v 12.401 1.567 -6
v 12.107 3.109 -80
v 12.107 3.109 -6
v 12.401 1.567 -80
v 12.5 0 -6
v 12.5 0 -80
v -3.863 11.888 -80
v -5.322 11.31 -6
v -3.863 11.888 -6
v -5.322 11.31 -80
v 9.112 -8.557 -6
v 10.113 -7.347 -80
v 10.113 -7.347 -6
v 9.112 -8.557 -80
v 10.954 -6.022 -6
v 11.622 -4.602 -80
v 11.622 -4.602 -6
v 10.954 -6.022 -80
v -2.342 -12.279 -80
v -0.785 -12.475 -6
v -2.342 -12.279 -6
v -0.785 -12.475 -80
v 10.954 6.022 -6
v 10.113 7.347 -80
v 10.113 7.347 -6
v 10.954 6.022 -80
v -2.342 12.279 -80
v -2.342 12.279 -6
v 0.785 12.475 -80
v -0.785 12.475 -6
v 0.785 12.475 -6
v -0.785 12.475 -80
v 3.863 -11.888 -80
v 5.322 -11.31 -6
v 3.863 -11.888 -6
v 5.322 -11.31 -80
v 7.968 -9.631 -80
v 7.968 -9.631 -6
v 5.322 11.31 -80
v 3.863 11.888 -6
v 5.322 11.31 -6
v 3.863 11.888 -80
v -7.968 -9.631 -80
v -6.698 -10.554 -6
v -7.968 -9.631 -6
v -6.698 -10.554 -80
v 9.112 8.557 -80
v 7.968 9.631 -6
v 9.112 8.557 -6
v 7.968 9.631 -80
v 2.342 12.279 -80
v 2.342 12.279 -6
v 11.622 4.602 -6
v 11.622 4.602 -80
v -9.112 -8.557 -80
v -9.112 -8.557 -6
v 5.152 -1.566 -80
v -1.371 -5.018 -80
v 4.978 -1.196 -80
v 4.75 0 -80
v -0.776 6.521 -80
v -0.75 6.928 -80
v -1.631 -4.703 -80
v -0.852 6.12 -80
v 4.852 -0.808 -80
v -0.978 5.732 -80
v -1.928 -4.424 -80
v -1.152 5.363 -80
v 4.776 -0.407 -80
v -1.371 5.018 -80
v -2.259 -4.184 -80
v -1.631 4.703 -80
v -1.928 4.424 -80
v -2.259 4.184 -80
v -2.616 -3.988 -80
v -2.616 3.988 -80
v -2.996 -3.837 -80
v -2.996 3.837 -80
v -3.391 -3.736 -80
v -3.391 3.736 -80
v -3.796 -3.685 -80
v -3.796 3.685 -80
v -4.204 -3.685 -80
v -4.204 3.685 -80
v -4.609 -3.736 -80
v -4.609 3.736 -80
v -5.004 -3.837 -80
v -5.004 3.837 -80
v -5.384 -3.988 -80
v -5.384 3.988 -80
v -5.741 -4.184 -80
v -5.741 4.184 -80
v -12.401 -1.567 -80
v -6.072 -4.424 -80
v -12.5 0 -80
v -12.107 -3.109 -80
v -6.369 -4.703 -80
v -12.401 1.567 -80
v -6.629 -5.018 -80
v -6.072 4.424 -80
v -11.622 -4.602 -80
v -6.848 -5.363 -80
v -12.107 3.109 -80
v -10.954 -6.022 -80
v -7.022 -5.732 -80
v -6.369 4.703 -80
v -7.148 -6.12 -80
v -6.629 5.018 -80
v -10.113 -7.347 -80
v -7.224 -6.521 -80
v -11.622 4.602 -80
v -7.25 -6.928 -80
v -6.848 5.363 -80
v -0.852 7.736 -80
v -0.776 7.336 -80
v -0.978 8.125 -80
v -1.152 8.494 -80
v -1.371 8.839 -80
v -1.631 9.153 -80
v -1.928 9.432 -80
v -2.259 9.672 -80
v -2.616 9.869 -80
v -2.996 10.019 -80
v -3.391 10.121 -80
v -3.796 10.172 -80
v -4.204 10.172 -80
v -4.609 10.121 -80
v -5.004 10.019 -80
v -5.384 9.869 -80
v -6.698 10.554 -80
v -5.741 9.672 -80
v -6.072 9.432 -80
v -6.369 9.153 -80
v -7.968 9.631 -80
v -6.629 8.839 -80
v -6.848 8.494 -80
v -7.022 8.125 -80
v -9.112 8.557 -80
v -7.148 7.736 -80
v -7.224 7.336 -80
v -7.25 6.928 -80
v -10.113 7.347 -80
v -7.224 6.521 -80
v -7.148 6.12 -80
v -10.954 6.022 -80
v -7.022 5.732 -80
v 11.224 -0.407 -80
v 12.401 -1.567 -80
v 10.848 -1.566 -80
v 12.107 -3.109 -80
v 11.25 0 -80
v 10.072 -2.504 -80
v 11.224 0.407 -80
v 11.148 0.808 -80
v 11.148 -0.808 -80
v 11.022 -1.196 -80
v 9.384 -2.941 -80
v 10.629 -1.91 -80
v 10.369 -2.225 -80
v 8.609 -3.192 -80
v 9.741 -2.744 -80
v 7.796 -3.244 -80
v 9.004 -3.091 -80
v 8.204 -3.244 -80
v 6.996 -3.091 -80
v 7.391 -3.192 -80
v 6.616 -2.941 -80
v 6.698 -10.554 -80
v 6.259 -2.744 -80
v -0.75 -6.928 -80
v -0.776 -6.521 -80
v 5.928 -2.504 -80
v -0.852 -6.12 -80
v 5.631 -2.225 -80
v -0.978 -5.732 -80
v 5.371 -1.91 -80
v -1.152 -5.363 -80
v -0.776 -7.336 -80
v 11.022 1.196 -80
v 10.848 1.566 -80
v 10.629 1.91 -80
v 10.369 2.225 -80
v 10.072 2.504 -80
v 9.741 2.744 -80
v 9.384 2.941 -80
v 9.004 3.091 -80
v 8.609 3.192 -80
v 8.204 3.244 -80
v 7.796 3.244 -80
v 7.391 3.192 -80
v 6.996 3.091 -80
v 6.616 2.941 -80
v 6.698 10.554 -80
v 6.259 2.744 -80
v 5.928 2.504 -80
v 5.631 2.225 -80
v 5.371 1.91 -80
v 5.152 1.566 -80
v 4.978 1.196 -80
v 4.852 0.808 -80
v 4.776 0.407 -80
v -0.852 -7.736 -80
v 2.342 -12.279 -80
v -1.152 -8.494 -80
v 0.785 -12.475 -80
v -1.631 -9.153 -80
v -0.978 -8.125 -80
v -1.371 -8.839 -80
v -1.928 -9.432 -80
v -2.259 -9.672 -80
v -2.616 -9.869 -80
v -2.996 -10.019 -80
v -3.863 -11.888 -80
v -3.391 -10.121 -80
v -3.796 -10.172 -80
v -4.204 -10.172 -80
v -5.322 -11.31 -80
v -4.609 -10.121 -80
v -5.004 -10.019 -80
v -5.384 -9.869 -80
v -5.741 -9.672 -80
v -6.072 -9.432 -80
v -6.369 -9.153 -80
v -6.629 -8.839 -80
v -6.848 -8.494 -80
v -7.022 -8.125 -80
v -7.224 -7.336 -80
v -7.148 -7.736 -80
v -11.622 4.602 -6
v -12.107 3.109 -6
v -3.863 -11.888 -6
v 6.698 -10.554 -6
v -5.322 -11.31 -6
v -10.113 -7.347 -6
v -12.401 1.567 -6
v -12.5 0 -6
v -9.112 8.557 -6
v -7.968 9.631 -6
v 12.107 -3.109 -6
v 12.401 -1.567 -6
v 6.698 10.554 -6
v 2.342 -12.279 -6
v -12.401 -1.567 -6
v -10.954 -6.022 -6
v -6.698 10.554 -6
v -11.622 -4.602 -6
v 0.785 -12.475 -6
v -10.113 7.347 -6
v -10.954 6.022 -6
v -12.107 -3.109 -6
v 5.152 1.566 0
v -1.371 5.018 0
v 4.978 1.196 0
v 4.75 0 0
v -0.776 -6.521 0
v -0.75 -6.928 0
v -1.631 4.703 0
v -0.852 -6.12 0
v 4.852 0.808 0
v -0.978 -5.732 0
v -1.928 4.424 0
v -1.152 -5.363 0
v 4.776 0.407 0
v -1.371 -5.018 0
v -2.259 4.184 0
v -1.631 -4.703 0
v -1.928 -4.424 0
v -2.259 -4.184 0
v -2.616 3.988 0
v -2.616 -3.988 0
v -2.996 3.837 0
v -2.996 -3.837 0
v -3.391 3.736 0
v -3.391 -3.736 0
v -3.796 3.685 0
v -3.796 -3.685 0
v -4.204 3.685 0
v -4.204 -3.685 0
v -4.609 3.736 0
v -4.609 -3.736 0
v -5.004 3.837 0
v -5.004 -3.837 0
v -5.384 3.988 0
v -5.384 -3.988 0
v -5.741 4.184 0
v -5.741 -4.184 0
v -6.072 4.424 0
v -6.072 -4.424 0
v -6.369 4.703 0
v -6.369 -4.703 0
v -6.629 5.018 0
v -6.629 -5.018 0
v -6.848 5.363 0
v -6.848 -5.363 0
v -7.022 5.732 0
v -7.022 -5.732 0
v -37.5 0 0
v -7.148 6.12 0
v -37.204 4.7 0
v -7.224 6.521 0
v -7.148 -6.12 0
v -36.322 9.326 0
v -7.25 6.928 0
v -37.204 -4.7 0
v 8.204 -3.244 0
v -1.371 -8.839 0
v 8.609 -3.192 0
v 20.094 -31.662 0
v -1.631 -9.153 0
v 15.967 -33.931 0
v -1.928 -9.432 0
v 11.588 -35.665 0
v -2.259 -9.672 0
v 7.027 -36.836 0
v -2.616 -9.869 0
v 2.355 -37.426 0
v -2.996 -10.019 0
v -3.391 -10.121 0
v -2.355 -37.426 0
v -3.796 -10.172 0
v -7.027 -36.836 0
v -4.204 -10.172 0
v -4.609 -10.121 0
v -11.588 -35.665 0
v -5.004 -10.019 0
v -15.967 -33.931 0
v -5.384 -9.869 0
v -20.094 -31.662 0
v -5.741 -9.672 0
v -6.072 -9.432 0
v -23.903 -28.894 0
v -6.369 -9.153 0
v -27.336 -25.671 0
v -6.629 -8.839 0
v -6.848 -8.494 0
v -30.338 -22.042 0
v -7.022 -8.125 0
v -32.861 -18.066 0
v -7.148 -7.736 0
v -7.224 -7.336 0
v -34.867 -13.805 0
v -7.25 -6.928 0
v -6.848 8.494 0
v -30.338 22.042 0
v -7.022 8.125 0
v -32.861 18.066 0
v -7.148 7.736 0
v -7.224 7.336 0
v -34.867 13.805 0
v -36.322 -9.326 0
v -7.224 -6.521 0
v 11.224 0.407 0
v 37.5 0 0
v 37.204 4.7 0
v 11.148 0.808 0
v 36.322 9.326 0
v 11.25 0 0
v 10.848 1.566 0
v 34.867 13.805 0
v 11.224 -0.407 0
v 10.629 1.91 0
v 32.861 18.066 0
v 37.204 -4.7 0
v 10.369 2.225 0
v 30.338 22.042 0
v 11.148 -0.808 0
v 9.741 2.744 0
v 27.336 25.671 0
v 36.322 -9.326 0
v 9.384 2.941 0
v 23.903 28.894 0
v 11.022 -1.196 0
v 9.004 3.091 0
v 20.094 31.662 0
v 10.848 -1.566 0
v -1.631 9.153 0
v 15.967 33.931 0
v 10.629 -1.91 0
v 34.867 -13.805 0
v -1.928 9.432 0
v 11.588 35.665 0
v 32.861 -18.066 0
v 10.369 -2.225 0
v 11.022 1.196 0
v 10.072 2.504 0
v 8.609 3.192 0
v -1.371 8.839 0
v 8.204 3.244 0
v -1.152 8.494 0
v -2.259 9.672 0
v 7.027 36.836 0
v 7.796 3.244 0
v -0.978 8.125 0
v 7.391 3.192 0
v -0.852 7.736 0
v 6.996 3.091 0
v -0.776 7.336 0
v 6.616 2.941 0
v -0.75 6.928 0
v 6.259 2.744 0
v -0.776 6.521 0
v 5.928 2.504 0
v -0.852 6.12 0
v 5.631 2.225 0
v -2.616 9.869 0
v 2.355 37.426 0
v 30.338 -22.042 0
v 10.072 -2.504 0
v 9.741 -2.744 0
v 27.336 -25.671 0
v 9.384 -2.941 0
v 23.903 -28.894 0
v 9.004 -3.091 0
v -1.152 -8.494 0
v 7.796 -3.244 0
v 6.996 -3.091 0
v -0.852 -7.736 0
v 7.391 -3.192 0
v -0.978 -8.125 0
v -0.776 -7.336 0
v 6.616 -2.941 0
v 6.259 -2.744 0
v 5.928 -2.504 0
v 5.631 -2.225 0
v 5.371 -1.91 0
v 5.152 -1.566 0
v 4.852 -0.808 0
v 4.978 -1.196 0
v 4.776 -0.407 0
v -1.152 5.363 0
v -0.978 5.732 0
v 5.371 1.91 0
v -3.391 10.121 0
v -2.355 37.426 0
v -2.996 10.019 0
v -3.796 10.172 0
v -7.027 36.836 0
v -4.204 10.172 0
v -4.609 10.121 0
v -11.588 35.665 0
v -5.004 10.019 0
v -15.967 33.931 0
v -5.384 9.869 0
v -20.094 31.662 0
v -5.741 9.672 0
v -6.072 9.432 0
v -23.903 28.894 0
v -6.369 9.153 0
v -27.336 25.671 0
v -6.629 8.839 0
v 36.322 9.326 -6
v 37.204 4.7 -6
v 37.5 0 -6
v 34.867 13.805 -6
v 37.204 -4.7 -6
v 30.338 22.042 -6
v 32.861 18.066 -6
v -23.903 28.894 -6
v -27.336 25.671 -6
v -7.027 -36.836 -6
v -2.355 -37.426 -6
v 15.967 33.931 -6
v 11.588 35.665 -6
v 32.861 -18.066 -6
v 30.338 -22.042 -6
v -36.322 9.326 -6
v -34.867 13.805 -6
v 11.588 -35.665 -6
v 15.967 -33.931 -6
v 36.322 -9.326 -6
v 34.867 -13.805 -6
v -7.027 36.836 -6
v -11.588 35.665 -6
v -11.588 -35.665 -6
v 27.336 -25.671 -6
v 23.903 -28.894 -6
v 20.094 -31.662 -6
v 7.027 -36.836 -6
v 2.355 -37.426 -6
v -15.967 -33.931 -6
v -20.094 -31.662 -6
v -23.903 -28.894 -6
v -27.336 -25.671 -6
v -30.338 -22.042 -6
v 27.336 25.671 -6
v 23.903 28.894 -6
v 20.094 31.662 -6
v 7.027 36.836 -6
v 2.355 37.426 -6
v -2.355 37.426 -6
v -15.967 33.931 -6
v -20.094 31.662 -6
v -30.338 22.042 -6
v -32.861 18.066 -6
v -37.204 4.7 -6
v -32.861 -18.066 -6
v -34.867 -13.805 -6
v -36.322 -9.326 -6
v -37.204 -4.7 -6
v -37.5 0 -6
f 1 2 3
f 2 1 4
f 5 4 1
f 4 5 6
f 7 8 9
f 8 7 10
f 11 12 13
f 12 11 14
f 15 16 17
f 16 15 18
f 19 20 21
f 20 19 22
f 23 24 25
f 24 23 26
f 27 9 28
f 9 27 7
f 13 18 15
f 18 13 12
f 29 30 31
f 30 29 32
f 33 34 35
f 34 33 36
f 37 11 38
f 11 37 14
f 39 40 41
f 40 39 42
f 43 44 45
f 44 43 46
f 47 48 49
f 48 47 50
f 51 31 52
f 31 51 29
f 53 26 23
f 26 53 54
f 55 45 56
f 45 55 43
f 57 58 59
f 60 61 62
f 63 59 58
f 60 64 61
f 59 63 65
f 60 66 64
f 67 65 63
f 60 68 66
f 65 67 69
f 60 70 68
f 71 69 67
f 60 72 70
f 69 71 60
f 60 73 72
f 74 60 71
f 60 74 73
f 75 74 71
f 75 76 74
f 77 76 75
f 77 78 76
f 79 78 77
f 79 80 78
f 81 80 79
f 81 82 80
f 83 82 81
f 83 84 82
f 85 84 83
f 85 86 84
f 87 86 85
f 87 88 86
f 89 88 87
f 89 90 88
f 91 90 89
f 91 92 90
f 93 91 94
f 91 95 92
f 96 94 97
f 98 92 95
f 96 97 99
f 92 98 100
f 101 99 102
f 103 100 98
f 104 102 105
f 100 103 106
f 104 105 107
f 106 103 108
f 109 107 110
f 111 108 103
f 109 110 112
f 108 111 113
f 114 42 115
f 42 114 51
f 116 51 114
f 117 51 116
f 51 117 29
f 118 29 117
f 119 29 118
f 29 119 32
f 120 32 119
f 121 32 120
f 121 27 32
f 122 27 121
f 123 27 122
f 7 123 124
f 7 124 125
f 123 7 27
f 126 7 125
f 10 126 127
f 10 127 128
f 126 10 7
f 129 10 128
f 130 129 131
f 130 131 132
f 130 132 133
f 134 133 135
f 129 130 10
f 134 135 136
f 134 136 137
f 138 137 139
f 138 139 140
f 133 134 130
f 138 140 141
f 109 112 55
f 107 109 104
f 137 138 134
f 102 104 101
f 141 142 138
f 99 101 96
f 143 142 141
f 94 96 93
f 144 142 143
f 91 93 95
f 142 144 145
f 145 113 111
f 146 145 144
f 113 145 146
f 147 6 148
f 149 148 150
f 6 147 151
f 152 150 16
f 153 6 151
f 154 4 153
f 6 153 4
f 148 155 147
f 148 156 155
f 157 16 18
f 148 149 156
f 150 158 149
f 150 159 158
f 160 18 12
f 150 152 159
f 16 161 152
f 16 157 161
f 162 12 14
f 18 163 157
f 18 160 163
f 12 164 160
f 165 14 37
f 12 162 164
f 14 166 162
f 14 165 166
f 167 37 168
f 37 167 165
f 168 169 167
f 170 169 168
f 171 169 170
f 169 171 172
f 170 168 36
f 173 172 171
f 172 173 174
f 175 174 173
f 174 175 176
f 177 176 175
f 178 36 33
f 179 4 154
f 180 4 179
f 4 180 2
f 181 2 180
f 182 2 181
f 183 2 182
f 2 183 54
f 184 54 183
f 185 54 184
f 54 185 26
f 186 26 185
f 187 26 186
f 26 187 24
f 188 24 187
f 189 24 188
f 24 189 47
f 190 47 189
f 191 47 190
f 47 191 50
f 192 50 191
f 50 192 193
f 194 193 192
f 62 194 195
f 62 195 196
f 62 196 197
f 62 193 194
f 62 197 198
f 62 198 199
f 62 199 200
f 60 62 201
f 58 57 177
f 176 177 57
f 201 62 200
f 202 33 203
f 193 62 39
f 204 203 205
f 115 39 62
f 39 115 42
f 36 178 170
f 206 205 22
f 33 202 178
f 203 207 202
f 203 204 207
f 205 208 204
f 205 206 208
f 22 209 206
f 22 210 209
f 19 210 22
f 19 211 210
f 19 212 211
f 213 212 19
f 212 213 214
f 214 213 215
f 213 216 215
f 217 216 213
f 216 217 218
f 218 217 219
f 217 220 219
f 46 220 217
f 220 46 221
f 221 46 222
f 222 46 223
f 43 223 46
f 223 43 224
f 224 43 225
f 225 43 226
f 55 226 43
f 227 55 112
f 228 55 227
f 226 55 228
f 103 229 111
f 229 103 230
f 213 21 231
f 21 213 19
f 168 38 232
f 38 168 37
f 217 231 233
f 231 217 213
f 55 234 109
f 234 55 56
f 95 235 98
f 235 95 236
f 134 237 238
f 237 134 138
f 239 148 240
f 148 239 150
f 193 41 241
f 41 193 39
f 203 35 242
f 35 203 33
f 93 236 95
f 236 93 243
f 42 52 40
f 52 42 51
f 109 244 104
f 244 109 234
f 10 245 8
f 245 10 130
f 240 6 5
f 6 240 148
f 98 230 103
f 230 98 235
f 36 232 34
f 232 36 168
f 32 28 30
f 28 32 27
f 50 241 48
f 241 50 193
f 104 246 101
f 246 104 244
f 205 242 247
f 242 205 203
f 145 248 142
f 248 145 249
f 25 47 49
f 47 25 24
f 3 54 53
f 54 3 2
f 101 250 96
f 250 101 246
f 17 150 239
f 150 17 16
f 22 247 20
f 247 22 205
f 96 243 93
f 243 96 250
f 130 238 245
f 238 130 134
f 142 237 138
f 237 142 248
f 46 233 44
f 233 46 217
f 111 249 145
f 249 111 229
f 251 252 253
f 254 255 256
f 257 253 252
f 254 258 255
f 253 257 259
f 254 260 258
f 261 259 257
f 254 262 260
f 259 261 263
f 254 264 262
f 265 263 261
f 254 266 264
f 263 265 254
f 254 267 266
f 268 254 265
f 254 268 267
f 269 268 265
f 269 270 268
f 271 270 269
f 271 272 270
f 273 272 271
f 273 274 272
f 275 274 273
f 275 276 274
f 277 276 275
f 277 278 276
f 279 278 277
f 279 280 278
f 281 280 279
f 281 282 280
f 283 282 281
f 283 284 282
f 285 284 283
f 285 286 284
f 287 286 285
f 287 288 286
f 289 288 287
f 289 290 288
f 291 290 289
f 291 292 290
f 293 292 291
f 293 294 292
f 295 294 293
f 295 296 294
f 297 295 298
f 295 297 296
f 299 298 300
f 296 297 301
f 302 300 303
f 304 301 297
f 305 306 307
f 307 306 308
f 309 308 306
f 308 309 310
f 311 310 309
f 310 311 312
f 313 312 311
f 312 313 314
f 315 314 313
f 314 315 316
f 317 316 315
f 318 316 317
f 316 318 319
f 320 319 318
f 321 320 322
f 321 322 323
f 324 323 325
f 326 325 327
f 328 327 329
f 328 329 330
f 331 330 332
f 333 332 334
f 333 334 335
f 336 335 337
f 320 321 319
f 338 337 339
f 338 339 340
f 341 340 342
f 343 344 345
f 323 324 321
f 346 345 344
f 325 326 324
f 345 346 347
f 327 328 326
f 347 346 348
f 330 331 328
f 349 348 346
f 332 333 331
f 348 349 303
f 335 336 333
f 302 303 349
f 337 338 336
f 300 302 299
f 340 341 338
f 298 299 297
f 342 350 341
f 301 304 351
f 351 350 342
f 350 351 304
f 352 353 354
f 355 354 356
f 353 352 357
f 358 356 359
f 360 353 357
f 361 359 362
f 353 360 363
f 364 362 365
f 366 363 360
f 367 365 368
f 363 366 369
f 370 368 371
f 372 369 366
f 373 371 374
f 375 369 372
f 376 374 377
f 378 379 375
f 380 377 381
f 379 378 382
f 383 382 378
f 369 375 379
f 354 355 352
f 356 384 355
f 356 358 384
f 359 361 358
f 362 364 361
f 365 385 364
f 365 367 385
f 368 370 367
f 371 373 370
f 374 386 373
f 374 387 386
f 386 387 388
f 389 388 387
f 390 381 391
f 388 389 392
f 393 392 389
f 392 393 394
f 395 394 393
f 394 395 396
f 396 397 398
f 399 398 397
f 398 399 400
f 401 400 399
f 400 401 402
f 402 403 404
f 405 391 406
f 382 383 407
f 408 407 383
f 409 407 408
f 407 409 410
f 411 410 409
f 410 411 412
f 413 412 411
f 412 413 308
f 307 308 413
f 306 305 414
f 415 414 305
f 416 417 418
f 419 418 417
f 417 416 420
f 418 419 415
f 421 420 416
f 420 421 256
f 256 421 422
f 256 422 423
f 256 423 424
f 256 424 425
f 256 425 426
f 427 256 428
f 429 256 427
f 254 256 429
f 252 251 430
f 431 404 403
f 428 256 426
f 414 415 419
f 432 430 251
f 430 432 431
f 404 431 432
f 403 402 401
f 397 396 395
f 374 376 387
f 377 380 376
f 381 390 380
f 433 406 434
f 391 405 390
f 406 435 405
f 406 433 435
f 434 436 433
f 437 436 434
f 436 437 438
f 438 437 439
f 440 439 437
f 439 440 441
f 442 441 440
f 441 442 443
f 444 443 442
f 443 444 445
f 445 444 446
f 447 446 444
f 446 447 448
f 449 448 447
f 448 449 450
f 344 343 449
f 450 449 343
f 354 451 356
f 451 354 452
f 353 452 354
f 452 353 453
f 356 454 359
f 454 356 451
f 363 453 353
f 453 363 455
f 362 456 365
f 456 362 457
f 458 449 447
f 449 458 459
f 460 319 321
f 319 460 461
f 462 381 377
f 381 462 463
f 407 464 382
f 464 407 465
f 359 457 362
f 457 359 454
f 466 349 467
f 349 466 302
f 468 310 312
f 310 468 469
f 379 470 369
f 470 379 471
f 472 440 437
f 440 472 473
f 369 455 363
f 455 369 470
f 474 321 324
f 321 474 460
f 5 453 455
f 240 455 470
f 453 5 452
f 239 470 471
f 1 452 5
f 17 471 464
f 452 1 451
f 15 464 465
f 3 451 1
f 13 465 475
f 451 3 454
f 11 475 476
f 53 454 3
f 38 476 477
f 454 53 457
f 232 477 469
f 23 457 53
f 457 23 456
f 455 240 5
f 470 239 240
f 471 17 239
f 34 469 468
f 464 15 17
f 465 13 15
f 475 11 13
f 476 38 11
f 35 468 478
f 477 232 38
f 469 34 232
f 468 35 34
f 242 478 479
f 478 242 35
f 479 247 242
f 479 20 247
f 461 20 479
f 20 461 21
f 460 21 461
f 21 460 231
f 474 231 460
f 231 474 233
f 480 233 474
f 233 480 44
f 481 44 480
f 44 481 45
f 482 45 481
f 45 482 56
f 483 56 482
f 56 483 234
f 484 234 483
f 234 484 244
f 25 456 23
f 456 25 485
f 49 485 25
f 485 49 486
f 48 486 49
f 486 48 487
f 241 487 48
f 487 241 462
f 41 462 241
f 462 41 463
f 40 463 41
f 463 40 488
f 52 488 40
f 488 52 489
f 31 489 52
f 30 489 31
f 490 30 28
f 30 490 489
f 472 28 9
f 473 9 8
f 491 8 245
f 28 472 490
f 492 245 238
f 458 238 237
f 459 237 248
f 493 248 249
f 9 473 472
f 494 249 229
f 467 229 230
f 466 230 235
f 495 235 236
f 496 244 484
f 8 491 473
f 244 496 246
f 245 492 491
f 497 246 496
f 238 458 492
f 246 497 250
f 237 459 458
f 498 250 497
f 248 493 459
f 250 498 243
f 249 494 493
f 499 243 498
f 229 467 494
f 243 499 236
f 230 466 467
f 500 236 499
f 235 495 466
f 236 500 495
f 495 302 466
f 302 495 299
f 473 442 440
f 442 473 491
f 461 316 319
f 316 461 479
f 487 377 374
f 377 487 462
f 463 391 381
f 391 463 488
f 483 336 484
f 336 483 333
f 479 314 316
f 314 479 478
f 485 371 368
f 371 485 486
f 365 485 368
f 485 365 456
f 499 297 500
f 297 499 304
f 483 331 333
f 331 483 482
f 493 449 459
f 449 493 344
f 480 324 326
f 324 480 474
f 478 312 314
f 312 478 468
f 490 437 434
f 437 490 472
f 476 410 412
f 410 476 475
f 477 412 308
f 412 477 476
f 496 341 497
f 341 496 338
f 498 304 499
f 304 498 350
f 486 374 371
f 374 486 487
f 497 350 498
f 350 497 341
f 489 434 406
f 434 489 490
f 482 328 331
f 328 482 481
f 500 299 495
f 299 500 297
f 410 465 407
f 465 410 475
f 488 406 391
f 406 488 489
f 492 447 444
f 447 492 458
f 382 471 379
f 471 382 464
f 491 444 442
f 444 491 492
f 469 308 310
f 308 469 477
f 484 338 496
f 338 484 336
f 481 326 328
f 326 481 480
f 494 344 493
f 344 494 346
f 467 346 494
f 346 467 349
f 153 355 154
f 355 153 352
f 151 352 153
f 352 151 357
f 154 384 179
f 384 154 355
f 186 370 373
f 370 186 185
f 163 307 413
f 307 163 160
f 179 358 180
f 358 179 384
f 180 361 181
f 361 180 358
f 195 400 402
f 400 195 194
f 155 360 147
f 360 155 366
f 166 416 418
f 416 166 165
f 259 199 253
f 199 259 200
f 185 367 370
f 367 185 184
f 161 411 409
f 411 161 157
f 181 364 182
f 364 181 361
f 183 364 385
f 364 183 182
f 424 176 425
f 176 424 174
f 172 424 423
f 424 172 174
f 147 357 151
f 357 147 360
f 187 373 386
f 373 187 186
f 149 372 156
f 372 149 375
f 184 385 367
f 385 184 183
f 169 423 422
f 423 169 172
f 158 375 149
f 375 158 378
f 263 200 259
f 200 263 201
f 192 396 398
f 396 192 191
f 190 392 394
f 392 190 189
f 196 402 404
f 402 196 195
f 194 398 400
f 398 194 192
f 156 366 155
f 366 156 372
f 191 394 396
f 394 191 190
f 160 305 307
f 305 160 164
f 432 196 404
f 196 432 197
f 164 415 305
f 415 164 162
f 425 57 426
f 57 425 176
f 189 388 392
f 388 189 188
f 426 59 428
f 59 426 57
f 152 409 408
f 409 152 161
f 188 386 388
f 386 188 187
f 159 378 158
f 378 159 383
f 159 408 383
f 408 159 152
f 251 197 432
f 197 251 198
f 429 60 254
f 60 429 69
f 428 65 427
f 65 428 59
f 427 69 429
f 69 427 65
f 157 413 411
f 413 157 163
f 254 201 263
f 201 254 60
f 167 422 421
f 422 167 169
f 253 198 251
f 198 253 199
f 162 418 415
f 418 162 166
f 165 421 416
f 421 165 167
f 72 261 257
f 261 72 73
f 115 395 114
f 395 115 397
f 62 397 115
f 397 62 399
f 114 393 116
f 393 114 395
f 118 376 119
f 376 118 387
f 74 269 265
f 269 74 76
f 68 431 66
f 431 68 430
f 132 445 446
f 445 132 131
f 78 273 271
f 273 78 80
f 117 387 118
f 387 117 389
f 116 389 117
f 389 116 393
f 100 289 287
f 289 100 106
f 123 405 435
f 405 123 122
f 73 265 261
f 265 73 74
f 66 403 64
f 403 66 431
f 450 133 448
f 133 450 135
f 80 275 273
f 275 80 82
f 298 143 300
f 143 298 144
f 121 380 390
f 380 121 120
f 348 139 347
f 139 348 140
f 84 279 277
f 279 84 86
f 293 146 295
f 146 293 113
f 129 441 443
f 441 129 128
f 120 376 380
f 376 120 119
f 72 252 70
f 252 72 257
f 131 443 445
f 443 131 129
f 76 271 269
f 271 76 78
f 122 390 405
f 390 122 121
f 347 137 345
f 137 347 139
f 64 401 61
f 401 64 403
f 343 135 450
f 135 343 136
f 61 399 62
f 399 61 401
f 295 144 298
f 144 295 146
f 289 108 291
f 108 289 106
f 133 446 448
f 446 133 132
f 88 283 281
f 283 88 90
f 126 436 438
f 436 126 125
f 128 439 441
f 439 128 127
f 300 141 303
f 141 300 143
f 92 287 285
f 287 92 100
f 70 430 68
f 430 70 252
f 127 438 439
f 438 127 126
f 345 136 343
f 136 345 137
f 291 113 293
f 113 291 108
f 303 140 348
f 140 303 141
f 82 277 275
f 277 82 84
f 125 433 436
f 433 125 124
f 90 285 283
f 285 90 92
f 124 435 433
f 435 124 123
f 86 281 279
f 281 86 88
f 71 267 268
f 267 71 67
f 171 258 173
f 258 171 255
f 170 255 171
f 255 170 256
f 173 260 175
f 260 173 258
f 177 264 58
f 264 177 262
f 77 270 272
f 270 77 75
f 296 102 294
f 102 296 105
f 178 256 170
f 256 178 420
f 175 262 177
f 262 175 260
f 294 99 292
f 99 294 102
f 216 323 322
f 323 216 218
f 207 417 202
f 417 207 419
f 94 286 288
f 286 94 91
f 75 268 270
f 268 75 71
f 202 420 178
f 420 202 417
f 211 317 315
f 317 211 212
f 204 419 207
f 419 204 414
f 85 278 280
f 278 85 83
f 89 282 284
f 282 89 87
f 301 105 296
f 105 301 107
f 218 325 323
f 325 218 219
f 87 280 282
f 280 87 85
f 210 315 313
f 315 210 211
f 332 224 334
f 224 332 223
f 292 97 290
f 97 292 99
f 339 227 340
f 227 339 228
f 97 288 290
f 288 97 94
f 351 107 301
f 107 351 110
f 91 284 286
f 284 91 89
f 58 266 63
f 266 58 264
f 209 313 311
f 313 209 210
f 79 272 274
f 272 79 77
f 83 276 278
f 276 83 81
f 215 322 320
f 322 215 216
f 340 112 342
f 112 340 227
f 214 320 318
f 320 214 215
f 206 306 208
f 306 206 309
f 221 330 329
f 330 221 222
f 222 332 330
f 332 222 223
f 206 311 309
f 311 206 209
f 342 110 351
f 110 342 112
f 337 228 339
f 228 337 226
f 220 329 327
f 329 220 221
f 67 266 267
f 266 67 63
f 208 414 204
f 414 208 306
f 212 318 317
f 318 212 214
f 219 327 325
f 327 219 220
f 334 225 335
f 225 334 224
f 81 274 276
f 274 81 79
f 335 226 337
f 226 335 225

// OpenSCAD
$fn = 50;


difference() {
	union() {
		translate(v = [0, 0, -80.0000000000]) {
			cylinder(h = 80, r = 12.5000000000);
		}
		translate(v = [0, 0, -6.0000000000]) {
			cylinder(h = 6, r = 37.5000000000);
		}
	}
	union() {
		#translate(v = [8.0000000000, 0.0000000000, -80]) {
			cylinder(h = 80, r = 3.2500000000);
		}
		#translate(v = [-4.0000000000, 6.9282032303, -80]) {
			cylinder(h = 80, r = 3.2500000000);
		}
		#translate(v = [-4.0000000000, -6.9282032303, -80]) {
			cylinder(h = 80, r = 3.2500000000);
		}
	}
}
